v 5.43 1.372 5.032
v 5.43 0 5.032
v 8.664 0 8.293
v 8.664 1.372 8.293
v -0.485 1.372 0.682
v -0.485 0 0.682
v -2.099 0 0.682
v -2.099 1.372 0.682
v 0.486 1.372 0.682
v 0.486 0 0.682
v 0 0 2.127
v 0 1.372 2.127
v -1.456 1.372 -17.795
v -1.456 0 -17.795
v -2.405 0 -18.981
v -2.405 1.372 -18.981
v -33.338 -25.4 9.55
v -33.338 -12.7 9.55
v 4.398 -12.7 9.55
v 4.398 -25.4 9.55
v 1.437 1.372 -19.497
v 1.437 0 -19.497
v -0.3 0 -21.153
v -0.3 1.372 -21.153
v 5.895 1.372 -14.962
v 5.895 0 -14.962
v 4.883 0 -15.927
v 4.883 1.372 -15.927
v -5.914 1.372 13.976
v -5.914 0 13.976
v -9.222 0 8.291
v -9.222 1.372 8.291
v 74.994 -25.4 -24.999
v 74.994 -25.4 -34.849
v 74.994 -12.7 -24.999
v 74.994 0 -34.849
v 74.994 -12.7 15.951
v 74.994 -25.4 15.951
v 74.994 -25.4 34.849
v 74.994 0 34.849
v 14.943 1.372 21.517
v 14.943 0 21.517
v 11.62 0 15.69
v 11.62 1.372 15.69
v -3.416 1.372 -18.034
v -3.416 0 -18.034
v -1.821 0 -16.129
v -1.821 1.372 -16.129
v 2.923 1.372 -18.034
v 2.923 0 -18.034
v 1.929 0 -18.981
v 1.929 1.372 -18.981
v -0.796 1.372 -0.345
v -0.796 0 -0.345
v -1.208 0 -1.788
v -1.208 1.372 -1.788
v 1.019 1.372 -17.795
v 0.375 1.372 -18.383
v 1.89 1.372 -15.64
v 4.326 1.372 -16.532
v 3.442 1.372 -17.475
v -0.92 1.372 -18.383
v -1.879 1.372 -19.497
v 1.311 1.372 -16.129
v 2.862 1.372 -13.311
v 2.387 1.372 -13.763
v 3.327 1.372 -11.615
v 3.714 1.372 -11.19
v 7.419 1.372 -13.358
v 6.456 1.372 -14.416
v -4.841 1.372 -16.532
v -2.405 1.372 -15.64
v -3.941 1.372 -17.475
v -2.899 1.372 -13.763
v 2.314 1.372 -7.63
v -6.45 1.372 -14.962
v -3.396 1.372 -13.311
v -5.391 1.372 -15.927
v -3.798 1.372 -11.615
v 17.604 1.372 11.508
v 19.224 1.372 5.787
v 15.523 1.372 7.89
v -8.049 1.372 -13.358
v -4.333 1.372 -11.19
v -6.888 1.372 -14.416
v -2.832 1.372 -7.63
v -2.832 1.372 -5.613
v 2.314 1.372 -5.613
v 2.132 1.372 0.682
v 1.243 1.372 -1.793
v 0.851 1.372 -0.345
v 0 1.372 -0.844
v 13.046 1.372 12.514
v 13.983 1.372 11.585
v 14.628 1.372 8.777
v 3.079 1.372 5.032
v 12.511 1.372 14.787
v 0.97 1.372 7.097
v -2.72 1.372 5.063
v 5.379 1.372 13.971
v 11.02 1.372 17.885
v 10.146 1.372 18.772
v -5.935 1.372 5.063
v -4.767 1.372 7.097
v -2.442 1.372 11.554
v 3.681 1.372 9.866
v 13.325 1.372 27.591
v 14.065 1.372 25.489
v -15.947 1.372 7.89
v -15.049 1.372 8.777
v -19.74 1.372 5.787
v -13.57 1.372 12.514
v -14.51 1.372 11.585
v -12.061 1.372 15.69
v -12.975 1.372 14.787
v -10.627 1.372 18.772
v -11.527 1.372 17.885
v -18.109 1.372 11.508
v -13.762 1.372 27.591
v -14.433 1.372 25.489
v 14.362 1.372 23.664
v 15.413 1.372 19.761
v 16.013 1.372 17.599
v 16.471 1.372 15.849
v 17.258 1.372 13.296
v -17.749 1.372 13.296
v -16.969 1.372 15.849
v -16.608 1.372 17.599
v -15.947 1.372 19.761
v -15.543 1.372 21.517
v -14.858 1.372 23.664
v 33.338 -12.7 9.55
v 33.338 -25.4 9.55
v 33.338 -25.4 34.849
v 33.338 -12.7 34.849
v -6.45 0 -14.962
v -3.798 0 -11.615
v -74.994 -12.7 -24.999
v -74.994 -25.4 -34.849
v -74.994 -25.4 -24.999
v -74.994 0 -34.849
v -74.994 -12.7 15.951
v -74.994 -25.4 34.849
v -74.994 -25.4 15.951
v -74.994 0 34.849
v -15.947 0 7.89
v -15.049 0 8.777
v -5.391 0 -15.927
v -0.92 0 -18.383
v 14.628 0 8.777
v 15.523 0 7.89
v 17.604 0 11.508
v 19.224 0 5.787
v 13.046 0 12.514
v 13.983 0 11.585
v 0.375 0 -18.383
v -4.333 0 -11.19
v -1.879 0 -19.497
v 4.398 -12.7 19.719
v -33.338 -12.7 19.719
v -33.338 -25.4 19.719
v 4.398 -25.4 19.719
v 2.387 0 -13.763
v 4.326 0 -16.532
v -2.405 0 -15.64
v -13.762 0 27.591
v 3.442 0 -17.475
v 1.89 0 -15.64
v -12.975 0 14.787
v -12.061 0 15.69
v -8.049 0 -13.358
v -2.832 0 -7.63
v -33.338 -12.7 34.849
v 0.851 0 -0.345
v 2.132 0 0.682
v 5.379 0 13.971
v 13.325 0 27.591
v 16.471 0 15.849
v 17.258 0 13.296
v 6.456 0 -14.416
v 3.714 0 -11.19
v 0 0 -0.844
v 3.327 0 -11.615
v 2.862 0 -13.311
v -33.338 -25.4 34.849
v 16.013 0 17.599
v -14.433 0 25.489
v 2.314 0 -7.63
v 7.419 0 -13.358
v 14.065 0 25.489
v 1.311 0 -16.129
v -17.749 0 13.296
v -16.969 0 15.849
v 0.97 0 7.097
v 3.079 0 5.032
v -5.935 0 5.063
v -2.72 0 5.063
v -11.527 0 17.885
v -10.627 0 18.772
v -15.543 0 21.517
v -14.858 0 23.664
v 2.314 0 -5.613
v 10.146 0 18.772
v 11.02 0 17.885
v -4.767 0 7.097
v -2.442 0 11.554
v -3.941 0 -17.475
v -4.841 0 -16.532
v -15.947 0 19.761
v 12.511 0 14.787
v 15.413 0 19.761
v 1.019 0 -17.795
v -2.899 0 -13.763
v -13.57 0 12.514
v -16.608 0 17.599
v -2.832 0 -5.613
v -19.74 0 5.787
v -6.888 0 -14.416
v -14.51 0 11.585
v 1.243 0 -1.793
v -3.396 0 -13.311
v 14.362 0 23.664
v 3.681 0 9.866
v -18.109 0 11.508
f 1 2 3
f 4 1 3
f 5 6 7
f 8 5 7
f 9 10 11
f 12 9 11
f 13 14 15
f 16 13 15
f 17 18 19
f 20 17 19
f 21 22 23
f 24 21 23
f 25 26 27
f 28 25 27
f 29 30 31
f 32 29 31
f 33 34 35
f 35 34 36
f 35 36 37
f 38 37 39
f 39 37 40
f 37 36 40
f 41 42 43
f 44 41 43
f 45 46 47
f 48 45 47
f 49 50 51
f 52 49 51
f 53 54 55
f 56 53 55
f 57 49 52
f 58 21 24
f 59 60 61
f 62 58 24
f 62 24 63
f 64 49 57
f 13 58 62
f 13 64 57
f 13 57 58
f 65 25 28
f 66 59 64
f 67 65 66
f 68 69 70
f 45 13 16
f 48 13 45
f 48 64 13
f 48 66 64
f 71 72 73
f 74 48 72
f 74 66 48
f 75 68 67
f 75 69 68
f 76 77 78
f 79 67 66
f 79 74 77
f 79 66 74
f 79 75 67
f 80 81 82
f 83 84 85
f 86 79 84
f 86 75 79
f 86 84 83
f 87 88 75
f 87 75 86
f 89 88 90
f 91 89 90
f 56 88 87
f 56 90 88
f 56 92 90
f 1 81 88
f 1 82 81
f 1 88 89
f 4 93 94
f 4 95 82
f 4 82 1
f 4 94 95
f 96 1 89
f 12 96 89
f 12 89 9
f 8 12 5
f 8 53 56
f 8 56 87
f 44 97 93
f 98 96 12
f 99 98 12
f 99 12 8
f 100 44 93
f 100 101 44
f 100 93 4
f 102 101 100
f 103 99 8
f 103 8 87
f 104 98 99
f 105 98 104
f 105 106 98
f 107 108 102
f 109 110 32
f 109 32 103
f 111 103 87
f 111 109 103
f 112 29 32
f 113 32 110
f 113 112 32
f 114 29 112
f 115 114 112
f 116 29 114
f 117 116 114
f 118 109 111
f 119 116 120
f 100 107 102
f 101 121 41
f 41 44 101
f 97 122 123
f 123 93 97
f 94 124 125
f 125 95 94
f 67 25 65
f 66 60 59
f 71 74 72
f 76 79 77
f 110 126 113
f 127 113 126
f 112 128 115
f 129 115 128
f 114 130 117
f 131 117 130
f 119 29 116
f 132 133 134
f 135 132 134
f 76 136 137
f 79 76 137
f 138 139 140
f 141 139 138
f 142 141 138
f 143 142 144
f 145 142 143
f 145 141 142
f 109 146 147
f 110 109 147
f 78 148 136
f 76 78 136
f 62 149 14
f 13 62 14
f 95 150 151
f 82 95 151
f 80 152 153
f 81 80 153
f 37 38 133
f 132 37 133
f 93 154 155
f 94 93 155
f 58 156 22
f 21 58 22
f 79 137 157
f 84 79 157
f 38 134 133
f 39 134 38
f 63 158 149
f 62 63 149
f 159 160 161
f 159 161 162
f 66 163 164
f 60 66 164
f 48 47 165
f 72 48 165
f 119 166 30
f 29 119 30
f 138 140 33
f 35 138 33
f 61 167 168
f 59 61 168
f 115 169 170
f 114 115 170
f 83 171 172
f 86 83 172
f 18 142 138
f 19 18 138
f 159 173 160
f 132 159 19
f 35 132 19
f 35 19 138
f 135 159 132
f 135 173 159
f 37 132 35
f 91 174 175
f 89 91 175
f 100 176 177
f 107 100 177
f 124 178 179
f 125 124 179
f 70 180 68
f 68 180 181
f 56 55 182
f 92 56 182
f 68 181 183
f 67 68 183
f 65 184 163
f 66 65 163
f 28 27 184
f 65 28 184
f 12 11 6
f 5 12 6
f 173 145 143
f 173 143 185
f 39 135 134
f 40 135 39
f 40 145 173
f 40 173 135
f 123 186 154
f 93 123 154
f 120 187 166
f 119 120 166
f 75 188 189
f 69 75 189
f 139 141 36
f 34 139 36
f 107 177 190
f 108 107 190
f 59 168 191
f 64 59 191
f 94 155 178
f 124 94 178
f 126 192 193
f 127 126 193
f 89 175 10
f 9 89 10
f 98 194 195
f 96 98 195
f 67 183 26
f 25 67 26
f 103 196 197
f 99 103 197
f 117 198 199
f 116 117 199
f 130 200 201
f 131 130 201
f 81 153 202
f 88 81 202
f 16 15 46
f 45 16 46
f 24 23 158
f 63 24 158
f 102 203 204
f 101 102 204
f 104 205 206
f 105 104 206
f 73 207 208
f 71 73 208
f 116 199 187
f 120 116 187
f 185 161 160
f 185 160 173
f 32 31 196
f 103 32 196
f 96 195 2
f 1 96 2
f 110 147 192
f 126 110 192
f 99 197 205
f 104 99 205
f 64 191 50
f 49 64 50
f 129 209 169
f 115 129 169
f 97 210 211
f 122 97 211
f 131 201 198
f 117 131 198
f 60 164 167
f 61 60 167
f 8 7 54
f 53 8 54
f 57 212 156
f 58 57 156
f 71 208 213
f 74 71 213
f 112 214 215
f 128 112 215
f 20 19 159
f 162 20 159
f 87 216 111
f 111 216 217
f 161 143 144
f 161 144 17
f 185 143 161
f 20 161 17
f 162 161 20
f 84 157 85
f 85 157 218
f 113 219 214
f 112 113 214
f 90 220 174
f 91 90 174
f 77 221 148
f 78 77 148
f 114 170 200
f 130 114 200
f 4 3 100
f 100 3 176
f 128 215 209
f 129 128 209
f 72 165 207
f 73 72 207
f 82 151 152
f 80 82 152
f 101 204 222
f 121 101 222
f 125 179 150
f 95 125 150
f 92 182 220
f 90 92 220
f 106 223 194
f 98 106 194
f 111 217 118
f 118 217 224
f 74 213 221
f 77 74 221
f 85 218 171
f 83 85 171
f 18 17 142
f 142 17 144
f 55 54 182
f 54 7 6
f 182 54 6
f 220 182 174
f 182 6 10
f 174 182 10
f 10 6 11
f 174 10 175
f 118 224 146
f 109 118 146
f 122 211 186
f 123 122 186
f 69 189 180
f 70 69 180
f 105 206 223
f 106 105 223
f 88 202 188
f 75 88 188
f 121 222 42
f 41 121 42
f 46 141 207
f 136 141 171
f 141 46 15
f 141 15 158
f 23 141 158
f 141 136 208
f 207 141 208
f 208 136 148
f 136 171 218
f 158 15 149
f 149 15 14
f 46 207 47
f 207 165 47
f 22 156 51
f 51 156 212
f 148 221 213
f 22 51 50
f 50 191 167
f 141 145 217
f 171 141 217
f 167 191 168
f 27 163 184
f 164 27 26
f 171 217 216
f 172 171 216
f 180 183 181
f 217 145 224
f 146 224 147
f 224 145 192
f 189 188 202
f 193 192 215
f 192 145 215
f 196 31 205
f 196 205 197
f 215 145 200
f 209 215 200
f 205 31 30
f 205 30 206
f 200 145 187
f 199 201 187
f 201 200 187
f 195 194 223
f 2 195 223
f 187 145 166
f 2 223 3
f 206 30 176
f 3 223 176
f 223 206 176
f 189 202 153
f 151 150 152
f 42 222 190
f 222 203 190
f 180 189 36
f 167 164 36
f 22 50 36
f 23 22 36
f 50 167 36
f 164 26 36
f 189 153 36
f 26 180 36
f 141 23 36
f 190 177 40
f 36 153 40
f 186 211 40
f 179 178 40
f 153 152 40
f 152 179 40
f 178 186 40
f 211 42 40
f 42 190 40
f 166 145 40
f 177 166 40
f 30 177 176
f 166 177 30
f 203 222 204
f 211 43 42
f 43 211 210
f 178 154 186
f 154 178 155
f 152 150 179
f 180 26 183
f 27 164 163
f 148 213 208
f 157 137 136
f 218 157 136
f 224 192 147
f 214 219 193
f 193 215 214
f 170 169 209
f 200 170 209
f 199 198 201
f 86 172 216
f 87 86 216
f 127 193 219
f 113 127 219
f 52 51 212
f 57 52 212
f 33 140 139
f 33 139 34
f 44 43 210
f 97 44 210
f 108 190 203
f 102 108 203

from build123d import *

# Parameters (mm, degrees)
F0_W     = 149.987
F0_H     = 69.6976
F1_DEPTH = 25.4
F2_W     = 66.675
F2_H     = 25.2984
F3_DEPTH = 12.7
F5_DEPTH = 12.7
F6_W     = 37.735215
F6_H     = 10.168377
F7_DEPTH = 12.7
F9_DEPTH = 1.3716


with BuildPart() as f1:
    # F0 (on Front) → F1 (new body)
    with BuildSketch(Plane.XZ):
        Rectangle(F0_W, F0_H)
    extrude(amount=F1_DEPTH)

    # F2 (on face) → F3 (cut)
    with BuildSketch(Plane.XZ.offset(25.4)):
        with Locations((0, 22.1996)):
            Rectangle(F2_W, F2_H)
    extrude(amount=-F3_DEPTH, mode=Mode.SUBTRACT)

    # F4 (on face) → F5 (cut)
    with BuildSketch(Plane.XZ.offset(25.4)):
        Polygon((33.3375, 9.5504), (-33.3375, 9.5504), (-74.9935, 15.9512), (-74.9935, -24.998723), (74.9935, -24.998723), (74.9935, 15.9512), align=None)
    extrude(amount=-F5_DEPTH, mode=Mode.SUBTRACT)

    # F6 (on face) → F7 (join)
    with BuildSketch(Plane.XZ.offset(12.7)):
        with Locations((-14.469893, 14.634588)):
            Rectangle(F6_W, F6_H)
    extrude(amount=F7_DEPTH)

    # F8 (on face) → F9 (join)
    with BuildSketch(Plane(origin=(0, 0, 0), x_dir=(-1, 0, 0), z_dir=(0, 1, 0))):
        Polygon((-5.378736, 13.970545), (-13.324757, 27.590852), (-14.065389, 25.489114), (-10.146485, 18.771706), (-11.020009, 17.885251), (-14.361666, 23.663847), (-14.942966, 21.517376), (-11.619632, 15.689826), (-12.511065, 14.787045), (-15.413008, 19.761277), (-16.012603, 17.598834), (-13.045956, 12.513692), (-13.982809, 11.584633), (-16.470851, 15.849397), (-17.257973, 13.296365), (-14.628438, 8.777128), (-15.523009, 7.89), (-17.603708, 11.507705), (-19.224059, 5.78715), (-2.314166, -5.613022), (-2.314166, -7.630318), (-7.419162, -13.35848), (-6.456276, -14.415695), (-3.713523, -11.190438), (-3.327152, -11.61466), (-5.894728, -14.962248), (-4.883376, -15.92657), (-2.861757, -13.310585), (-2.387249, -13.763027), (-4.326059, -16.532207), (-3.442212, -17.475365), (-1.889574, -15.639646), (-1.311372, -16.128685), (-2.922849, -18.03397), (-1.92949, -18.981067), (-1.01934, -17.795069), (-0.374972, -18.382913), (-1.436909, -19.49672), (0.299996, -21.152735), (1.878888, -19.49672), (0.919775, -18.382913), (1.456053, -17.795069), (2.404852, -18.981067), (3.415506, -18.03397), (1.820631, -16.128685), (2.404852, -15.639646), (3.941494, -17.475365), (4.840794, -16.532207), (2.89907, -13.763027), (3.395835, -13.310585), (5.390918, -15.92657), (6.449709, -14.962248), (3.797929, -11.61466), (4.333463, -11.190438), (6.88834, -14.415695), (8.049124, -13.35848), (2.832049, -7.630318), (2.832049, -5.613022), (19.73976, 5.78715), (18.108712, 11.507705), (15.947106, 7.89), (15.048685, 8.777128), (17.748964, 13.296365), (16.968758, 15.849397), (14.510422, 11.584633), (13.569537, 12.513692), (16.607948, 17.598834), (15.947106, 19.761277), (12.974964, 14.787045), (12.060693, 15.689826), (15.542698, 21.517376), (14.857555, 23.663847), (11.526601, 17.885251), (10.627024, 18.771706), (14.432989, 25.489114), (13.762125, 27.590852), (5.914255, 13.976232), (9.222287, 8.290899), (5.935366, 5.0631), (2.720125, 5.0631), (4.767341, 7.097367), (2.442414, 11.553886), (-3.681165, 9.865881), (-0.970141, 7.097367), (-3.078866, 5.03243), (-5.430478, 5.03243), (-8.664062, 8.293143), align=None)
        Polygon((-0.485612, 0.682145), (0, 2.126915), (0.485041, 0.682145), (2.099235, 0.682145), (0.796223, -0.344701), (1.207654, -1.78771), (0, -0.84399), (-1.242889, -1.792924), (-0.851036, -0.344701), (-2.131865, 0.682145), align=None, mode=Mode.SUBTRACT)
    extrude(amount=F9_DEPTH)


solid = f1.part
